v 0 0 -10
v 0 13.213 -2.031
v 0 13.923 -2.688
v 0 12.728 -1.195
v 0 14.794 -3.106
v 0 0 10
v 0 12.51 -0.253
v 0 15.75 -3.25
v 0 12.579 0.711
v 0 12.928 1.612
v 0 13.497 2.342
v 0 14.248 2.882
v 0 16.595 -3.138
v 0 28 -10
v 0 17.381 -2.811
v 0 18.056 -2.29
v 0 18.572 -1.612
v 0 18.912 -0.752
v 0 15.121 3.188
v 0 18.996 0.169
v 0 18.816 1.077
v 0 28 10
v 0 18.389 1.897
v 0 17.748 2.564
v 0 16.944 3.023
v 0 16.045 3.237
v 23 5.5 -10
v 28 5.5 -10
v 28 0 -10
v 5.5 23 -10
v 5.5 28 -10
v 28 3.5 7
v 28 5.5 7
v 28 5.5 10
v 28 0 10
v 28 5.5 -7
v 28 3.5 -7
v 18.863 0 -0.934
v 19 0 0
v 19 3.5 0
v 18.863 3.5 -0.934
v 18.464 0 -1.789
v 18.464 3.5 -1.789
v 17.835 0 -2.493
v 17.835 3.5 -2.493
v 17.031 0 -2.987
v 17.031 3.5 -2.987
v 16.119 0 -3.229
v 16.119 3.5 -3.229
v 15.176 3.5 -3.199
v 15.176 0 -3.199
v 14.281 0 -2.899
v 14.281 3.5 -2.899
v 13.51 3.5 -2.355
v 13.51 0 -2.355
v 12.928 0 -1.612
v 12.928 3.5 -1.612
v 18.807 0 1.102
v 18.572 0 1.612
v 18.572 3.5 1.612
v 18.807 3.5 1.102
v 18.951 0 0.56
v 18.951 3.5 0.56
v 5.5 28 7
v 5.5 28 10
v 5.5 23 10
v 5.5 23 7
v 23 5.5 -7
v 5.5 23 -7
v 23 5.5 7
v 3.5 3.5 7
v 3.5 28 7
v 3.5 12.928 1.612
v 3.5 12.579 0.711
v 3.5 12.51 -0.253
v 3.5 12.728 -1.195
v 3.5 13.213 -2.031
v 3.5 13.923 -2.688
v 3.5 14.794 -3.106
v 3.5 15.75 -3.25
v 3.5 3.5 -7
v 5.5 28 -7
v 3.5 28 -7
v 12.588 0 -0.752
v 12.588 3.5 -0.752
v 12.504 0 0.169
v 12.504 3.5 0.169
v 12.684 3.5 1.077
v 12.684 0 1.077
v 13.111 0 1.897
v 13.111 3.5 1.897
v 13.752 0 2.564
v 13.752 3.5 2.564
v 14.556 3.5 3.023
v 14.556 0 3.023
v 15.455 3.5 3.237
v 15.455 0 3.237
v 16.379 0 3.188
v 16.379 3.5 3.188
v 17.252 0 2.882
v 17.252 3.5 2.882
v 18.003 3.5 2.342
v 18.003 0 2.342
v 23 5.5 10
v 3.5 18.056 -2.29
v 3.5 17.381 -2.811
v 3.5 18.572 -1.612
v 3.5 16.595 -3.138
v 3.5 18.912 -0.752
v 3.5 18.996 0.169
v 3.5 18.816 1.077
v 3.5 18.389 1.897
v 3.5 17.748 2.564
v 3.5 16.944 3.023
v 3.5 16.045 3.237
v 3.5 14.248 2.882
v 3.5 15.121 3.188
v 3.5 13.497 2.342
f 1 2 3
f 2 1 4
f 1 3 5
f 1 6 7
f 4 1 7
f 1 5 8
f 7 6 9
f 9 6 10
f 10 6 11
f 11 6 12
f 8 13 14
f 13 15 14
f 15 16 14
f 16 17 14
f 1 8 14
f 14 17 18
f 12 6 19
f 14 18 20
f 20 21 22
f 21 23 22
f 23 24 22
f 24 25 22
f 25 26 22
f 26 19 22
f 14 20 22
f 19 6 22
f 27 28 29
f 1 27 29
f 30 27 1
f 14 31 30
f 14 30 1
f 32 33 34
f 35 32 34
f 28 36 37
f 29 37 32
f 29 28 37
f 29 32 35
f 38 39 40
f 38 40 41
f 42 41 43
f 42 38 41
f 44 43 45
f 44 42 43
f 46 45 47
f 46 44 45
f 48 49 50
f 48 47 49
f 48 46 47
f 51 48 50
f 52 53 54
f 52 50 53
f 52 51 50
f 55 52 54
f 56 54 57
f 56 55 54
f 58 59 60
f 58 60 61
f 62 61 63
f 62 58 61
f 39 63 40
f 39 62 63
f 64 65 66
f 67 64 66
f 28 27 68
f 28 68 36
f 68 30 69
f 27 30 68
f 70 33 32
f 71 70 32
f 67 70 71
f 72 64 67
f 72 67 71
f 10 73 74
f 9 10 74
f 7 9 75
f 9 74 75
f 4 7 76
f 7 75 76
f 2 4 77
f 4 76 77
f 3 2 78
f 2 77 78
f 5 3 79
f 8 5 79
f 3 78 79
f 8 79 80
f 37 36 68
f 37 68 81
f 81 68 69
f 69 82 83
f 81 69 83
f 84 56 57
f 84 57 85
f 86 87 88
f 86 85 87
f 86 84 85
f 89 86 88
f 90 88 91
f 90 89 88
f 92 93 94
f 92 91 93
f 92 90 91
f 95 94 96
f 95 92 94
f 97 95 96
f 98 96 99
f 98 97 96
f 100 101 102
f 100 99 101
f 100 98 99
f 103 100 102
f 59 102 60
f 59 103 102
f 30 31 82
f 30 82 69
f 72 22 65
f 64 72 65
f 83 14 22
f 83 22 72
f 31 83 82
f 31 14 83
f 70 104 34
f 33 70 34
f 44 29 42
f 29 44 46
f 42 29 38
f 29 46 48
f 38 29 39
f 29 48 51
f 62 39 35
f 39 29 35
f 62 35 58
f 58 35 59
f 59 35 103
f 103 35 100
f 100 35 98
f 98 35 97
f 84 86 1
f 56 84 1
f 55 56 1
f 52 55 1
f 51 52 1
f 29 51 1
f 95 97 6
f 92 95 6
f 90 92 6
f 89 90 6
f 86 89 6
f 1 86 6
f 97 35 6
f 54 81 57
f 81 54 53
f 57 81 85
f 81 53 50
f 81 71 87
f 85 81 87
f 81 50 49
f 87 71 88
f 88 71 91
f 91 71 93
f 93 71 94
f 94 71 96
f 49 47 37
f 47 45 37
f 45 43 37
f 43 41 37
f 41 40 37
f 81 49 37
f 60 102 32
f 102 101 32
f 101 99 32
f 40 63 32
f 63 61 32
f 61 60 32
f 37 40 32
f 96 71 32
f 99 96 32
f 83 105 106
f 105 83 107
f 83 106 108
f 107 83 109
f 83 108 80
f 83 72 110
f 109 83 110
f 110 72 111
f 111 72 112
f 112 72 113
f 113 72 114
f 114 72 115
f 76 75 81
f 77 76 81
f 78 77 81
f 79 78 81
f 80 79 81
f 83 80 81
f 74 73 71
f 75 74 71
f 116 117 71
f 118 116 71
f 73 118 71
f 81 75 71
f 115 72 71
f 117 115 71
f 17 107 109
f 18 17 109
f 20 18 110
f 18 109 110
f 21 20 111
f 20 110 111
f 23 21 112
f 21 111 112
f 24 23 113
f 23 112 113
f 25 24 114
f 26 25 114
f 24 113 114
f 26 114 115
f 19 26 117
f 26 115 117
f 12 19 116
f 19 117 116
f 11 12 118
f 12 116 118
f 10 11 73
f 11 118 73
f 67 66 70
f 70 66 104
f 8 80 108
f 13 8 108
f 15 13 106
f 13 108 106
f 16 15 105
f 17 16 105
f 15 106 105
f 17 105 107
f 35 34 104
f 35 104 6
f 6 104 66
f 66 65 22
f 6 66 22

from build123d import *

# Parameters (mm, degrees)
BOSS_EXTRUDE1_DEPTH     = 10
BOSS_EXTRUDE2_DEPTH     = 3
CUT_EXTRUDE1_DEPTH      = 39.52596527
CUT_EXTRUDE1_DEPTH_BACK = 39.52596527
CUT_EXTRUDE2_DEPTH      = 39.52596527


with BuildPart() as part:
    # Sketch1 → Boss-Extrude1 (new, symmetric)
    with BuildSketch(Plane.XY):
        Polygon((0, 0), (0, 28), (3.5, 28), (3.5, 3.5), (28, 3.5), (28, 0), align=None)
    extrude(amount=BOSS_EXTRUDE1_DEPTH, both=True)

    # Sketch2 → Boss-Extrude2 (add)
    with BuildSketch(Plane.XY.offset(10)):
        Polygon((28, 5.5), (28, 3.5), (3.5, 3.5), (3.5, 28), (5.5, 28), (5.5, 23), (23, 5.5), align=None)
    boss_extrude2 = extrude(amount=-BOSS_EXTRUDE2_DEPTH)

    # Mirror1: Boss-Extrude2 across plane
    add(boss_extrude2.mirror(Plane.XY))

    # Sketch3 → Cut-Extrude1 (cut, two sides: drawn at the far end of the back side and taken through both)
    with BuildSketch(Plane(origin=(0, 3.5, 0), x_dir=(1, 0, 0), z_dir=(0, 1, 0)).offset(-CUT_EXTRUDE1_DEPTH_BACK)):
        with BuildLine():
            ThreePointArc((19, 0), (16.584170789, 3.141123858), (12.928209788, 1.61245155))
            Line((12.928209788, 1.61245155), (18.571790212, -1.61245155))
            ThreePointArc((18.571790212, -1.61245155), (18.891123858, -0.834170789), (19, 0))
        make_face()
        with BuildLine():
            Line((18.571790212, -1.61245155), (12.928209788, 1.61245155))
            ThreePointArc((12.928209788, 1.61245155), (14.13754845, -2.821790212), (18.571790212, -1.61245155))
        make_face()
    extrude(amount=CUT_EXTRUDE1_DEPTH + CUT_EXTRUDE1_DEPTH_BACK, mode=Mode.SUBTRACT)

    # Sketch4 → Cut-Extrude2 (cut, through all)
    with BuildSketch(Plane(origin=(3.5, 0, 0), x_dir=(0, 0, -1), z_dir=(1, 0, 0))):
        with BuildLine():
            ThreePointArc((3.25, 15.75), (2.810957803, 17.381262159), (1.61245155, 18.571790212))
            Line((1.61245155, 18.571790212), (-1.61245155, 12.928209788))
            ThreePointArc((-1.61245155, 12.928209788), (1.631262159, 12.939042197), (3.25, 15.75))
        make_face()
        with BuildLine():
            Line((-1.61245155, 12.928209788), (1.61245155, 18.571790212))
            ThreePointArc((1.61245155, 18.571790212), (-2.821790212, 17.36245155), (-1.61245155, 12.928209788))
        make_face()
    extrude(amount=-CUT_EXTRUDE2_DEPTH, mode=Mode.SUBTRACT)


solid = part.part
